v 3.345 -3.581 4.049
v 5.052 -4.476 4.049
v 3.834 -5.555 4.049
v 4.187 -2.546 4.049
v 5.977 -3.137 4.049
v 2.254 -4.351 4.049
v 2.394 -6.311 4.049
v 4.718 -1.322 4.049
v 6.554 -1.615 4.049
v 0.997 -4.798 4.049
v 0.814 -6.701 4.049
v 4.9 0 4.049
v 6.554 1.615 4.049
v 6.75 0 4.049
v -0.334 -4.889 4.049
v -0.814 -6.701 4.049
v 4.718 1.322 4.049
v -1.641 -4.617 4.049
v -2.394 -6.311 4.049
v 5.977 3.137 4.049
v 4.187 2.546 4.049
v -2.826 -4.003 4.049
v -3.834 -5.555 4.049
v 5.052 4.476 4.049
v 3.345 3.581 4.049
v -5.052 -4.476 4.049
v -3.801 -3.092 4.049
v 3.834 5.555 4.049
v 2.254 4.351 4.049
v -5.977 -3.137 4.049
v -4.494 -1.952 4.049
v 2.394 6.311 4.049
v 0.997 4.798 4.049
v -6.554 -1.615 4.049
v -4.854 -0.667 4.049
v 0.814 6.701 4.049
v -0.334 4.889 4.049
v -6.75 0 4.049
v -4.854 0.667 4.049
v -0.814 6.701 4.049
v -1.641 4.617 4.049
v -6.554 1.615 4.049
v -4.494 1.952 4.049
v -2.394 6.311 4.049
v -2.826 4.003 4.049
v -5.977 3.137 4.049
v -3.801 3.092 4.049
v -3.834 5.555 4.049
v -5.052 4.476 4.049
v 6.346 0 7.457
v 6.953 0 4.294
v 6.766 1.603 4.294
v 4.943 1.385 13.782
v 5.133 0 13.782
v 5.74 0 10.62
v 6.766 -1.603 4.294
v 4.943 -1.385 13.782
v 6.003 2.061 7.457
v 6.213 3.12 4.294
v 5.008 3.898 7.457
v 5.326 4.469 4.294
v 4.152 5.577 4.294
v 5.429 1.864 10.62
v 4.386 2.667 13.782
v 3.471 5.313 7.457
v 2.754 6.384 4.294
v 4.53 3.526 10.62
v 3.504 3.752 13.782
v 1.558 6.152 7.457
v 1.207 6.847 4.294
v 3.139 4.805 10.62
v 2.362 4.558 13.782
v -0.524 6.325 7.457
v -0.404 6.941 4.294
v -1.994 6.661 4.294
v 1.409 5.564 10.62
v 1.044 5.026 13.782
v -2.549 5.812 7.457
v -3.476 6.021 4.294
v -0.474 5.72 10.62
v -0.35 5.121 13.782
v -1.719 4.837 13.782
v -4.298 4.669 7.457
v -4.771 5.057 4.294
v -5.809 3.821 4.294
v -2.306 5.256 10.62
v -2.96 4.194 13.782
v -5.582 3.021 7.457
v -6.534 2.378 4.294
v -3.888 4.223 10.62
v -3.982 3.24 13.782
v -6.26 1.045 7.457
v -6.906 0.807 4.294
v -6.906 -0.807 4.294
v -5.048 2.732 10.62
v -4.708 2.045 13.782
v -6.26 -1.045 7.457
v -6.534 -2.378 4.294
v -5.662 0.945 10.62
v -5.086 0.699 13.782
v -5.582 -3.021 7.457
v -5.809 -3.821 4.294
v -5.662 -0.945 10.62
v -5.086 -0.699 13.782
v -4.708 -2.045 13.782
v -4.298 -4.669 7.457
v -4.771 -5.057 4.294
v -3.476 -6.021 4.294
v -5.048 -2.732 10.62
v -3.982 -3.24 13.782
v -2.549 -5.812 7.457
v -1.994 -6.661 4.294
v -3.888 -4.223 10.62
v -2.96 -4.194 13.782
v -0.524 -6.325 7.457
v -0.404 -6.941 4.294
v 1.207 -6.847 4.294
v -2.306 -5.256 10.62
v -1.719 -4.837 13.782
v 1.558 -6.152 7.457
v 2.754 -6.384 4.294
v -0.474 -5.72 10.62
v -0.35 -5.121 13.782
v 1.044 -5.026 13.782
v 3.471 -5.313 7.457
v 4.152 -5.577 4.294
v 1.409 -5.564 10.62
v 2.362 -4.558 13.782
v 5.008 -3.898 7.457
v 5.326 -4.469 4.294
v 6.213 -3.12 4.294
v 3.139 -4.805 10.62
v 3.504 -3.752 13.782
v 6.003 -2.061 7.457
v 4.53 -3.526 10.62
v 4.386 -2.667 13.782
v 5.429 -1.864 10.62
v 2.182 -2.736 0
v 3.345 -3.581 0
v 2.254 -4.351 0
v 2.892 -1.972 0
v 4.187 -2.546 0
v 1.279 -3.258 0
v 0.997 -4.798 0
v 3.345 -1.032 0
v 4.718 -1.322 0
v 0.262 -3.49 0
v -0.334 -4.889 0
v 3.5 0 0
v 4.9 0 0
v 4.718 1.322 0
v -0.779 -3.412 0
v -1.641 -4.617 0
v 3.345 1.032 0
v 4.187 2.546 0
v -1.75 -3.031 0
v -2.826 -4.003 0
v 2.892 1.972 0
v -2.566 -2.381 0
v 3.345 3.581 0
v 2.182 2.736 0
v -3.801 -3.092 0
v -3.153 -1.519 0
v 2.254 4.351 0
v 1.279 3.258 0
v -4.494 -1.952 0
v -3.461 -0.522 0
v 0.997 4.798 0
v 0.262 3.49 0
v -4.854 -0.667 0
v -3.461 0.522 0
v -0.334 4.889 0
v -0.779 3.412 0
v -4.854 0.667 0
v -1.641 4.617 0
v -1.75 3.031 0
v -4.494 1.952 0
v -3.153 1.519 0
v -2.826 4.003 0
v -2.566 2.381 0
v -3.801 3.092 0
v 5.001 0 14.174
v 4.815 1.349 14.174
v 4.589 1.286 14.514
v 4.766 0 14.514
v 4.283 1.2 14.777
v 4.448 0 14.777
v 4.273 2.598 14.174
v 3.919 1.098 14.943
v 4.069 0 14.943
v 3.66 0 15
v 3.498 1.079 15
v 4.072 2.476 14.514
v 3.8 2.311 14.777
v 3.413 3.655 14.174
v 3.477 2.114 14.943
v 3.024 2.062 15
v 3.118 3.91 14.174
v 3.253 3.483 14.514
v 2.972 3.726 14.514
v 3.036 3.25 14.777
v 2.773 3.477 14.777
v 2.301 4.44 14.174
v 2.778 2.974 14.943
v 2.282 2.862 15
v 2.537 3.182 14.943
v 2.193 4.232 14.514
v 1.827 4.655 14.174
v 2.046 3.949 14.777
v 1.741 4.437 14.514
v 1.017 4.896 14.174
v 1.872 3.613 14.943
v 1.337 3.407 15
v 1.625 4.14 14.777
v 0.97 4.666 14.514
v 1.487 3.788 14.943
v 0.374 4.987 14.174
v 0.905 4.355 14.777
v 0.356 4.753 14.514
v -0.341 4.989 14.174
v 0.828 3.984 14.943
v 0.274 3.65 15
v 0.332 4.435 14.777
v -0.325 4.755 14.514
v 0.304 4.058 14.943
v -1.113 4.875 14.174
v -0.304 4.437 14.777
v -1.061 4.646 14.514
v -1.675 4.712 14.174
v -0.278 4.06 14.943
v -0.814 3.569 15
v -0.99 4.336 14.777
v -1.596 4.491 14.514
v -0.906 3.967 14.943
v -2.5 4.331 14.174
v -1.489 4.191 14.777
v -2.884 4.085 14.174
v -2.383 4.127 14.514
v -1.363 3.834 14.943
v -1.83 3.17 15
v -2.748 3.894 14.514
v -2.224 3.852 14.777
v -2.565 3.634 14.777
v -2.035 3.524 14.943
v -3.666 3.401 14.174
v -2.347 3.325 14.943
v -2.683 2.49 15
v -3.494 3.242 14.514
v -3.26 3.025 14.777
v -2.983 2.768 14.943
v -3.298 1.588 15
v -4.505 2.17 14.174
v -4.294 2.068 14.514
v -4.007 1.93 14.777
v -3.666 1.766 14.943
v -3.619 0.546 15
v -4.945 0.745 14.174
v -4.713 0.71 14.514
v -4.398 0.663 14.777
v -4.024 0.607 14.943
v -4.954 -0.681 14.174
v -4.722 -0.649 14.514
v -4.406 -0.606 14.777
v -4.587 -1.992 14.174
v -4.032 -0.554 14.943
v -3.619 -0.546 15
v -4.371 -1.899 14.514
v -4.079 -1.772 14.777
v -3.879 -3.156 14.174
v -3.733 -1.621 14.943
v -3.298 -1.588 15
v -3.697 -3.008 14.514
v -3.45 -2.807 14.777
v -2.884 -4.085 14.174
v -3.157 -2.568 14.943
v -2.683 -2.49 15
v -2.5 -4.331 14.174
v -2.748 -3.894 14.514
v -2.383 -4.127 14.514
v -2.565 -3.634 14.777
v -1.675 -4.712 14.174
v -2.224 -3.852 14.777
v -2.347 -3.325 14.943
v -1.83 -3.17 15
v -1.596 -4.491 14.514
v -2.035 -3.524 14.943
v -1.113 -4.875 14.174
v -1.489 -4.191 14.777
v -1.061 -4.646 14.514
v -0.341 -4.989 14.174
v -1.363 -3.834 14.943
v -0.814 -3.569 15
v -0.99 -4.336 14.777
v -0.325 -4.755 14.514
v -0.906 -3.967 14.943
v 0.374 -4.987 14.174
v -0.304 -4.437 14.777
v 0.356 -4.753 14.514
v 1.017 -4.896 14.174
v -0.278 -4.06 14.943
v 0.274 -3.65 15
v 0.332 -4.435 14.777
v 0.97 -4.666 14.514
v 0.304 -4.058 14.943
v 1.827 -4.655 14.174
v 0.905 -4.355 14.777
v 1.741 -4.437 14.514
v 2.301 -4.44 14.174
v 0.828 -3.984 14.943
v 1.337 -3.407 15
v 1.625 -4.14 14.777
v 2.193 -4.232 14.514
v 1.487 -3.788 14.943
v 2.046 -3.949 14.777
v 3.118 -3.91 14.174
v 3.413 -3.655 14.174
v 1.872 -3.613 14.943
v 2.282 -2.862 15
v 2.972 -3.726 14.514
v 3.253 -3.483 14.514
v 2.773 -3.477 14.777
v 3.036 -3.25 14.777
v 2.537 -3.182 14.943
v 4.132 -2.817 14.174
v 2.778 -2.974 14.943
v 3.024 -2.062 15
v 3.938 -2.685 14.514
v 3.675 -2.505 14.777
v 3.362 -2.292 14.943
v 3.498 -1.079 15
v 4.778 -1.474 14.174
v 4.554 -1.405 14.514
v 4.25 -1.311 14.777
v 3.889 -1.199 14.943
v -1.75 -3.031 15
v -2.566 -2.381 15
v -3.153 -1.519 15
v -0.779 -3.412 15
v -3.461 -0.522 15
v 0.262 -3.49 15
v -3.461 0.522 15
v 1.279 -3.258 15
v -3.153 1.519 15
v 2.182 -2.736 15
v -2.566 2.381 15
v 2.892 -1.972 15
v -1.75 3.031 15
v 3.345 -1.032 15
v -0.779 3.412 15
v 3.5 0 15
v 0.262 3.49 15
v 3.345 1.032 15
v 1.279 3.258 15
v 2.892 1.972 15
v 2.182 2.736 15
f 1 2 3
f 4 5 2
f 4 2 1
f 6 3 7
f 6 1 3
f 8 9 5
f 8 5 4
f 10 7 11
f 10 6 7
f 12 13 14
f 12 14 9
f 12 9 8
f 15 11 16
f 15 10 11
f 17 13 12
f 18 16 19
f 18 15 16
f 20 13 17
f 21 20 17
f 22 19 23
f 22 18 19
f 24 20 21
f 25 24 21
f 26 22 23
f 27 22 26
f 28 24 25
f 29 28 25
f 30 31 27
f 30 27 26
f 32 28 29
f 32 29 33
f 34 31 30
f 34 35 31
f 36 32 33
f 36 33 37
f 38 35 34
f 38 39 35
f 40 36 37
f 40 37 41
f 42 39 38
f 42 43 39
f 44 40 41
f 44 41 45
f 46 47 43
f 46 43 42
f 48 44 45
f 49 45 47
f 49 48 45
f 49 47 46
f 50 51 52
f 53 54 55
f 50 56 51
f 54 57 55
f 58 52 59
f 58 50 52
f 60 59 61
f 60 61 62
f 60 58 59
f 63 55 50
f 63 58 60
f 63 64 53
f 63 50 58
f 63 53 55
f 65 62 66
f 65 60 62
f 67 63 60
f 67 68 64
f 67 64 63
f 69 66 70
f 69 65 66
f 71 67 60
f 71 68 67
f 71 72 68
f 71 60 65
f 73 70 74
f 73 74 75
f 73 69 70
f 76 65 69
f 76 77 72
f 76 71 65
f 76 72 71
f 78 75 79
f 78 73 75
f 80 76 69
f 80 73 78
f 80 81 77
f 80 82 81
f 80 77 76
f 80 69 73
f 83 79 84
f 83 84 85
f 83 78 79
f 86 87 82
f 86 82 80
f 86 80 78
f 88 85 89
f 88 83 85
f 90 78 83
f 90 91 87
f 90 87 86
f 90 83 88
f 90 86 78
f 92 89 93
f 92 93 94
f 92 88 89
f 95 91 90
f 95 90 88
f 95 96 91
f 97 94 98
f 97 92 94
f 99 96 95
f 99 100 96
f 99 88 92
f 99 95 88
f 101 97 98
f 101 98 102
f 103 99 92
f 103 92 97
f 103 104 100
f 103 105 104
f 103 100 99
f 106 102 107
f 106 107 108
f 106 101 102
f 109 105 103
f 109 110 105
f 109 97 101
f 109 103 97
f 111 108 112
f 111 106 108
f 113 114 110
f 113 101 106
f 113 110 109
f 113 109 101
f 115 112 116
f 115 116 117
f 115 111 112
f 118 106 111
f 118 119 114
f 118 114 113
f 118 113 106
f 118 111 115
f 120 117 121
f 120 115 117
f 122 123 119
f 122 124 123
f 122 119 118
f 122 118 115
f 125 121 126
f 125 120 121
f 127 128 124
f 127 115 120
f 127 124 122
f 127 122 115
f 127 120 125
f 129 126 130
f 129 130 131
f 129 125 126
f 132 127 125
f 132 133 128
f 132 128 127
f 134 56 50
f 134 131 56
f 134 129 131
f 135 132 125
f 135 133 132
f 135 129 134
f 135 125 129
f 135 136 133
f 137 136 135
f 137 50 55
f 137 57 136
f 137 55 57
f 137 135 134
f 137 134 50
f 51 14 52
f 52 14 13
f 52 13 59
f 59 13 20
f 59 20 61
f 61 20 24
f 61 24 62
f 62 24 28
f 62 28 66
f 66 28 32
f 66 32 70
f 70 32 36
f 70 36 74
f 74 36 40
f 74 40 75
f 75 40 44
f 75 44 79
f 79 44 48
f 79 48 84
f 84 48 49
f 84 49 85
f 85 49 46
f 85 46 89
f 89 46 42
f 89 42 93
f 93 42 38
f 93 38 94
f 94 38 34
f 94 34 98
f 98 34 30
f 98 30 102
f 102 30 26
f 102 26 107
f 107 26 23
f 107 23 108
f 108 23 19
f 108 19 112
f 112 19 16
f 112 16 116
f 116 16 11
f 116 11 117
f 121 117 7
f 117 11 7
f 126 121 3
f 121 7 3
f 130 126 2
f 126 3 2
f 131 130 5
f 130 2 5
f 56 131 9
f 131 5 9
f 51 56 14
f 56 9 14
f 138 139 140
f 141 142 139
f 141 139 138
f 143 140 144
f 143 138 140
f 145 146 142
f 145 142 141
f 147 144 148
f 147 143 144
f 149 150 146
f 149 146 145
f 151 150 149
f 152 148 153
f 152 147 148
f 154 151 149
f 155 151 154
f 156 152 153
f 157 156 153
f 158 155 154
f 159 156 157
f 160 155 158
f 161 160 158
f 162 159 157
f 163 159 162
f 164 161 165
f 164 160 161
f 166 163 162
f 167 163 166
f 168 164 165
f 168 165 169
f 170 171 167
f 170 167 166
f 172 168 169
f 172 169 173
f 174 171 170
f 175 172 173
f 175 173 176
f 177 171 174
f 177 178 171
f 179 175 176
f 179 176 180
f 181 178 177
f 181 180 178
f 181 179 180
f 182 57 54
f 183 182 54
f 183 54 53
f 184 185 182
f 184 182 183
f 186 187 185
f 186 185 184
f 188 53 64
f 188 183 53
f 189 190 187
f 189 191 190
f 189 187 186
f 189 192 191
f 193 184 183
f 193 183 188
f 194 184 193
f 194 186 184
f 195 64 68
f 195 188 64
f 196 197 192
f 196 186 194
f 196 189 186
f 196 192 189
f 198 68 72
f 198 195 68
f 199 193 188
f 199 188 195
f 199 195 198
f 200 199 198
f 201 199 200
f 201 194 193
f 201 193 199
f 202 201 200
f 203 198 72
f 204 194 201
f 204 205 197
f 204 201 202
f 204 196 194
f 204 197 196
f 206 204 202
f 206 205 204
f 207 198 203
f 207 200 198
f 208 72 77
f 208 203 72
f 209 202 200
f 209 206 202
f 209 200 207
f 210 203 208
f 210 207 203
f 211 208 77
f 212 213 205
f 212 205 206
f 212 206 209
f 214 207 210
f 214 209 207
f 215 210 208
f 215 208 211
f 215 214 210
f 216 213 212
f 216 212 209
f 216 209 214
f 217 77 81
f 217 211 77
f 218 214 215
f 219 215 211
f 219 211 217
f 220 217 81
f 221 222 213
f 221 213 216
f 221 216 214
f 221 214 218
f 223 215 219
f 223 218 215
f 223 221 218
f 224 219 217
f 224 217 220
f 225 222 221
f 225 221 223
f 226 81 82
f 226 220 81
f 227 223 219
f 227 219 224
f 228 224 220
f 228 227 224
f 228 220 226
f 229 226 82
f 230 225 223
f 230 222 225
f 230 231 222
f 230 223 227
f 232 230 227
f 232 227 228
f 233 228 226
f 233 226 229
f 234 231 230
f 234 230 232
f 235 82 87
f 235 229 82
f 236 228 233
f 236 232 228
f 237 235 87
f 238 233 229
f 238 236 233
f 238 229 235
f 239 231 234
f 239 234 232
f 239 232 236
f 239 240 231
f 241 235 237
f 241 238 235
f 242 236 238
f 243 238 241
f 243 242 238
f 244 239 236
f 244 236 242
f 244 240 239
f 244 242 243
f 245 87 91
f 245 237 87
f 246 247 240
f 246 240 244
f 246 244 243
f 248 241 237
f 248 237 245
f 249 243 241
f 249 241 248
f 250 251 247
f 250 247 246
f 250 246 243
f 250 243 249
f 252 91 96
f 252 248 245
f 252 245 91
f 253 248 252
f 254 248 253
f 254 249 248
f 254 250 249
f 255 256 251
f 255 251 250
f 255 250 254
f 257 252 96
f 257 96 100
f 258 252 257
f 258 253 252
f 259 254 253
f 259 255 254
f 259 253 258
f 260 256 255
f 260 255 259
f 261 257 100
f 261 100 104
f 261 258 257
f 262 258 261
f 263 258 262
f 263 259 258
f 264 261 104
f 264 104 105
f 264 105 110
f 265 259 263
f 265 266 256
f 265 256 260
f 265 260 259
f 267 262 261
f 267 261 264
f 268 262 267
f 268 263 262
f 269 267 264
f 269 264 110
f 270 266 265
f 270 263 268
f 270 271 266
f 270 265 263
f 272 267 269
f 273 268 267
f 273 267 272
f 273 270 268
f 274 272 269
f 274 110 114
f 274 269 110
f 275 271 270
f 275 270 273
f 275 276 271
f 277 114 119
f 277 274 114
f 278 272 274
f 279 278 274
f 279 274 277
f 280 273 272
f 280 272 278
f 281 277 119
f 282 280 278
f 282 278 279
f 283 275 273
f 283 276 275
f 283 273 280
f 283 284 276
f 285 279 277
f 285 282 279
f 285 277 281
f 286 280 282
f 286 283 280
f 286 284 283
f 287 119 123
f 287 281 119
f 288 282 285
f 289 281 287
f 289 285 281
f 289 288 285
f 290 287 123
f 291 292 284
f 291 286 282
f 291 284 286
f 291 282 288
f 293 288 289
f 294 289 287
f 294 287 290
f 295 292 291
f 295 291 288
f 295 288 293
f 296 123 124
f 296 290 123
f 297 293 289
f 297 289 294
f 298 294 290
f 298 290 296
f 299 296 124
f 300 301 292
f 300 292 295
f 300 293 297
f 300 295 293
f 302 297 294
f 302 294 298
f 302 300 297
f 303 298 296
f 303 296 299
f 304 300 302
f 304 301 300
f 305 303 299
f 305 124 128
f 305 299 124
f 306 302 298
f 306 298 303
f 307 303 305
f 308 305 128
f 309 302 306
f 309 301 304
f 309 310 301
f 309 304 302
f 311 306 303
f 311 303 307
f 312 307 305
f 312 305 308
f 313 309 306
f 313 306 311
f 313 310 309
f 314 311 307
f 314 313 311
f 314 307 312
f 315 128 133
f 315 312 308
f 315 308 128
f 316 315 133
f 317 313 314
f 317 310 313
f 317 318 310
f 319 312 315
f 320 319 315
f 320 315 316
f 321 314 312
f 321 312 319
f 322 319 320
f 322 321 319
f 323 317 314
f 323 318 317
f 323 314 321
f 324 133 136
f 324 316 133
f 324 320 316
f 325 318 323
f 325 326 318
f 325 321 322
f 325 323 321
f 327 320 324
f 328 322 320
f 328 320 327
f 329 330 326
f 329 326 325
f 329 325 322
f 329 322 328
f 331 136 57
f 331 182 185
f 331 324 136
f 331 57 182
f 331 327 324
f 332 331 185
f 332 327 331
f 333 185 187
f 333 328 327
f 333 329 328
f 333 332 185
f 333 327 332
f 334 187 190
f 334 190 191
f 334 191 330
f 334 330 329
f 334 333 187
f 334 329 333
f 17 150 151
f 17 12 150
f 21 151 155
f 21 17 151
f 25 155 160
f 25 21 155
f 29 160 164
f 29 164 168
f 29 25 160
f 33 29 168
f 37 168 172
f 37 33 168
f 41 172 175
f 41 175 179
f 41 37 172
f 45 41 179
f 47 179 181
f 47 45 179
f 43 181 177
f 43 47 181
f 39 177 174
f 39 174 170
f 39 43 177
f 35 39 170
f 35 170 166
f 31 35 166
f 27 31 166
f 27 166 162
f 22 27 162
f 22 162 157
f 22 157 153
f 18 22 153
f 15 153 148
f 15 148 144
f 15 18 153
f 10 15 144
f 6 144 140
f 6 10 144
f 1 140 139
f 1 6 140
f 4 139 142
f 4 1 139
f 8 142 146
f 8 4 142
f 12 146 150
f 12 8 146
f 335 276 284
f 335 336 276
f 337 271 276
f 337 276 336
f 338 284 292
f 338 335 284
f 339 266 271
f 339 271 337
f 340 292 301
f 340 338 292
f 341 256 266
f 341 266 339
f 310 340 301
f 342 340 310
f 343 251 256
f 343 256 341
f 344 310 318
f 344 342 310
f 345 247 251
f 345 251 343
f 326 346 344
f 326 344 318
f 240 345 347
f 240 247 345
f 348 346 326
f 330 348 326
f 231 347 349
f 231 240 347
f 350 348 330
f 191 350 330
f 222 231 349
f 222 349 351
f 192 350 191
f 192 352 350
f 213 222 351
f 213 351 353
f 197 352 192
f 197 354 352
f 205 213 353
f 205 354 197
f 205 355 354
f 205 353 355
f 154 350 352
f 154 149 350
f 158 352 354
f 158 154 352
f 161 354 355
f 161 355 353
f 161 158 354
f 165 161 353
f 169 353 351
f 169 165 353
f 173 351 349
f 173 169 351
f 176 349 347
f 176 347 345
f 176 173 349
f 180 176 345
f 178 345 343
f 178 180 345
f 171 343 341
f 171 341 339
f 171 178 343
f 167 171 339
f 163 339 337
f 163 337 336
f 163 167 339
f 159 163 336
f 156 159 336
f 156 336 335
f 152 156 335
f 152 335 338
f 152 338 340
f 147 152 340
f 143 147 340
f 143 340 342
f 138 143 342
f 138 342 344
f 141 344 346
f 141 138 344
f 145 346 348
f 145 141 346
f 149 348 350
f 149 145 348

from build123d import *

# Parameters (mm, degrees)
F2_R    = 1.5
F3_SIZE = 0.25


with BuildPart() as f1:
    # F0 (on Front) → F1 (revolve)
    with BuildSketch(Plane.XZ):
        Polygon((3.5, 15), (3.5, 0), (4.9, 0), (4.9, 4.048668), (7, 4.048668), (4.9, 15), align=None)
    revolve(axis=Axis((0, 0, 7.5), (0, 0, 1)))

    # F2
    f2_edges = [f1.edges().sort_by_distance(p)[0] for p in [
        (-4.9, 0, 15),
    ]]
    fillet(f2_edges, radius=F2_R)

    # F3
    f3_edges = [f1.edges().sort_by_distance(p)[0] for p in [
        (-7, 0, 4.048668),
    ]]
    chamfer(f3_edges, length=F3_SIZE)


solid = f1.part
